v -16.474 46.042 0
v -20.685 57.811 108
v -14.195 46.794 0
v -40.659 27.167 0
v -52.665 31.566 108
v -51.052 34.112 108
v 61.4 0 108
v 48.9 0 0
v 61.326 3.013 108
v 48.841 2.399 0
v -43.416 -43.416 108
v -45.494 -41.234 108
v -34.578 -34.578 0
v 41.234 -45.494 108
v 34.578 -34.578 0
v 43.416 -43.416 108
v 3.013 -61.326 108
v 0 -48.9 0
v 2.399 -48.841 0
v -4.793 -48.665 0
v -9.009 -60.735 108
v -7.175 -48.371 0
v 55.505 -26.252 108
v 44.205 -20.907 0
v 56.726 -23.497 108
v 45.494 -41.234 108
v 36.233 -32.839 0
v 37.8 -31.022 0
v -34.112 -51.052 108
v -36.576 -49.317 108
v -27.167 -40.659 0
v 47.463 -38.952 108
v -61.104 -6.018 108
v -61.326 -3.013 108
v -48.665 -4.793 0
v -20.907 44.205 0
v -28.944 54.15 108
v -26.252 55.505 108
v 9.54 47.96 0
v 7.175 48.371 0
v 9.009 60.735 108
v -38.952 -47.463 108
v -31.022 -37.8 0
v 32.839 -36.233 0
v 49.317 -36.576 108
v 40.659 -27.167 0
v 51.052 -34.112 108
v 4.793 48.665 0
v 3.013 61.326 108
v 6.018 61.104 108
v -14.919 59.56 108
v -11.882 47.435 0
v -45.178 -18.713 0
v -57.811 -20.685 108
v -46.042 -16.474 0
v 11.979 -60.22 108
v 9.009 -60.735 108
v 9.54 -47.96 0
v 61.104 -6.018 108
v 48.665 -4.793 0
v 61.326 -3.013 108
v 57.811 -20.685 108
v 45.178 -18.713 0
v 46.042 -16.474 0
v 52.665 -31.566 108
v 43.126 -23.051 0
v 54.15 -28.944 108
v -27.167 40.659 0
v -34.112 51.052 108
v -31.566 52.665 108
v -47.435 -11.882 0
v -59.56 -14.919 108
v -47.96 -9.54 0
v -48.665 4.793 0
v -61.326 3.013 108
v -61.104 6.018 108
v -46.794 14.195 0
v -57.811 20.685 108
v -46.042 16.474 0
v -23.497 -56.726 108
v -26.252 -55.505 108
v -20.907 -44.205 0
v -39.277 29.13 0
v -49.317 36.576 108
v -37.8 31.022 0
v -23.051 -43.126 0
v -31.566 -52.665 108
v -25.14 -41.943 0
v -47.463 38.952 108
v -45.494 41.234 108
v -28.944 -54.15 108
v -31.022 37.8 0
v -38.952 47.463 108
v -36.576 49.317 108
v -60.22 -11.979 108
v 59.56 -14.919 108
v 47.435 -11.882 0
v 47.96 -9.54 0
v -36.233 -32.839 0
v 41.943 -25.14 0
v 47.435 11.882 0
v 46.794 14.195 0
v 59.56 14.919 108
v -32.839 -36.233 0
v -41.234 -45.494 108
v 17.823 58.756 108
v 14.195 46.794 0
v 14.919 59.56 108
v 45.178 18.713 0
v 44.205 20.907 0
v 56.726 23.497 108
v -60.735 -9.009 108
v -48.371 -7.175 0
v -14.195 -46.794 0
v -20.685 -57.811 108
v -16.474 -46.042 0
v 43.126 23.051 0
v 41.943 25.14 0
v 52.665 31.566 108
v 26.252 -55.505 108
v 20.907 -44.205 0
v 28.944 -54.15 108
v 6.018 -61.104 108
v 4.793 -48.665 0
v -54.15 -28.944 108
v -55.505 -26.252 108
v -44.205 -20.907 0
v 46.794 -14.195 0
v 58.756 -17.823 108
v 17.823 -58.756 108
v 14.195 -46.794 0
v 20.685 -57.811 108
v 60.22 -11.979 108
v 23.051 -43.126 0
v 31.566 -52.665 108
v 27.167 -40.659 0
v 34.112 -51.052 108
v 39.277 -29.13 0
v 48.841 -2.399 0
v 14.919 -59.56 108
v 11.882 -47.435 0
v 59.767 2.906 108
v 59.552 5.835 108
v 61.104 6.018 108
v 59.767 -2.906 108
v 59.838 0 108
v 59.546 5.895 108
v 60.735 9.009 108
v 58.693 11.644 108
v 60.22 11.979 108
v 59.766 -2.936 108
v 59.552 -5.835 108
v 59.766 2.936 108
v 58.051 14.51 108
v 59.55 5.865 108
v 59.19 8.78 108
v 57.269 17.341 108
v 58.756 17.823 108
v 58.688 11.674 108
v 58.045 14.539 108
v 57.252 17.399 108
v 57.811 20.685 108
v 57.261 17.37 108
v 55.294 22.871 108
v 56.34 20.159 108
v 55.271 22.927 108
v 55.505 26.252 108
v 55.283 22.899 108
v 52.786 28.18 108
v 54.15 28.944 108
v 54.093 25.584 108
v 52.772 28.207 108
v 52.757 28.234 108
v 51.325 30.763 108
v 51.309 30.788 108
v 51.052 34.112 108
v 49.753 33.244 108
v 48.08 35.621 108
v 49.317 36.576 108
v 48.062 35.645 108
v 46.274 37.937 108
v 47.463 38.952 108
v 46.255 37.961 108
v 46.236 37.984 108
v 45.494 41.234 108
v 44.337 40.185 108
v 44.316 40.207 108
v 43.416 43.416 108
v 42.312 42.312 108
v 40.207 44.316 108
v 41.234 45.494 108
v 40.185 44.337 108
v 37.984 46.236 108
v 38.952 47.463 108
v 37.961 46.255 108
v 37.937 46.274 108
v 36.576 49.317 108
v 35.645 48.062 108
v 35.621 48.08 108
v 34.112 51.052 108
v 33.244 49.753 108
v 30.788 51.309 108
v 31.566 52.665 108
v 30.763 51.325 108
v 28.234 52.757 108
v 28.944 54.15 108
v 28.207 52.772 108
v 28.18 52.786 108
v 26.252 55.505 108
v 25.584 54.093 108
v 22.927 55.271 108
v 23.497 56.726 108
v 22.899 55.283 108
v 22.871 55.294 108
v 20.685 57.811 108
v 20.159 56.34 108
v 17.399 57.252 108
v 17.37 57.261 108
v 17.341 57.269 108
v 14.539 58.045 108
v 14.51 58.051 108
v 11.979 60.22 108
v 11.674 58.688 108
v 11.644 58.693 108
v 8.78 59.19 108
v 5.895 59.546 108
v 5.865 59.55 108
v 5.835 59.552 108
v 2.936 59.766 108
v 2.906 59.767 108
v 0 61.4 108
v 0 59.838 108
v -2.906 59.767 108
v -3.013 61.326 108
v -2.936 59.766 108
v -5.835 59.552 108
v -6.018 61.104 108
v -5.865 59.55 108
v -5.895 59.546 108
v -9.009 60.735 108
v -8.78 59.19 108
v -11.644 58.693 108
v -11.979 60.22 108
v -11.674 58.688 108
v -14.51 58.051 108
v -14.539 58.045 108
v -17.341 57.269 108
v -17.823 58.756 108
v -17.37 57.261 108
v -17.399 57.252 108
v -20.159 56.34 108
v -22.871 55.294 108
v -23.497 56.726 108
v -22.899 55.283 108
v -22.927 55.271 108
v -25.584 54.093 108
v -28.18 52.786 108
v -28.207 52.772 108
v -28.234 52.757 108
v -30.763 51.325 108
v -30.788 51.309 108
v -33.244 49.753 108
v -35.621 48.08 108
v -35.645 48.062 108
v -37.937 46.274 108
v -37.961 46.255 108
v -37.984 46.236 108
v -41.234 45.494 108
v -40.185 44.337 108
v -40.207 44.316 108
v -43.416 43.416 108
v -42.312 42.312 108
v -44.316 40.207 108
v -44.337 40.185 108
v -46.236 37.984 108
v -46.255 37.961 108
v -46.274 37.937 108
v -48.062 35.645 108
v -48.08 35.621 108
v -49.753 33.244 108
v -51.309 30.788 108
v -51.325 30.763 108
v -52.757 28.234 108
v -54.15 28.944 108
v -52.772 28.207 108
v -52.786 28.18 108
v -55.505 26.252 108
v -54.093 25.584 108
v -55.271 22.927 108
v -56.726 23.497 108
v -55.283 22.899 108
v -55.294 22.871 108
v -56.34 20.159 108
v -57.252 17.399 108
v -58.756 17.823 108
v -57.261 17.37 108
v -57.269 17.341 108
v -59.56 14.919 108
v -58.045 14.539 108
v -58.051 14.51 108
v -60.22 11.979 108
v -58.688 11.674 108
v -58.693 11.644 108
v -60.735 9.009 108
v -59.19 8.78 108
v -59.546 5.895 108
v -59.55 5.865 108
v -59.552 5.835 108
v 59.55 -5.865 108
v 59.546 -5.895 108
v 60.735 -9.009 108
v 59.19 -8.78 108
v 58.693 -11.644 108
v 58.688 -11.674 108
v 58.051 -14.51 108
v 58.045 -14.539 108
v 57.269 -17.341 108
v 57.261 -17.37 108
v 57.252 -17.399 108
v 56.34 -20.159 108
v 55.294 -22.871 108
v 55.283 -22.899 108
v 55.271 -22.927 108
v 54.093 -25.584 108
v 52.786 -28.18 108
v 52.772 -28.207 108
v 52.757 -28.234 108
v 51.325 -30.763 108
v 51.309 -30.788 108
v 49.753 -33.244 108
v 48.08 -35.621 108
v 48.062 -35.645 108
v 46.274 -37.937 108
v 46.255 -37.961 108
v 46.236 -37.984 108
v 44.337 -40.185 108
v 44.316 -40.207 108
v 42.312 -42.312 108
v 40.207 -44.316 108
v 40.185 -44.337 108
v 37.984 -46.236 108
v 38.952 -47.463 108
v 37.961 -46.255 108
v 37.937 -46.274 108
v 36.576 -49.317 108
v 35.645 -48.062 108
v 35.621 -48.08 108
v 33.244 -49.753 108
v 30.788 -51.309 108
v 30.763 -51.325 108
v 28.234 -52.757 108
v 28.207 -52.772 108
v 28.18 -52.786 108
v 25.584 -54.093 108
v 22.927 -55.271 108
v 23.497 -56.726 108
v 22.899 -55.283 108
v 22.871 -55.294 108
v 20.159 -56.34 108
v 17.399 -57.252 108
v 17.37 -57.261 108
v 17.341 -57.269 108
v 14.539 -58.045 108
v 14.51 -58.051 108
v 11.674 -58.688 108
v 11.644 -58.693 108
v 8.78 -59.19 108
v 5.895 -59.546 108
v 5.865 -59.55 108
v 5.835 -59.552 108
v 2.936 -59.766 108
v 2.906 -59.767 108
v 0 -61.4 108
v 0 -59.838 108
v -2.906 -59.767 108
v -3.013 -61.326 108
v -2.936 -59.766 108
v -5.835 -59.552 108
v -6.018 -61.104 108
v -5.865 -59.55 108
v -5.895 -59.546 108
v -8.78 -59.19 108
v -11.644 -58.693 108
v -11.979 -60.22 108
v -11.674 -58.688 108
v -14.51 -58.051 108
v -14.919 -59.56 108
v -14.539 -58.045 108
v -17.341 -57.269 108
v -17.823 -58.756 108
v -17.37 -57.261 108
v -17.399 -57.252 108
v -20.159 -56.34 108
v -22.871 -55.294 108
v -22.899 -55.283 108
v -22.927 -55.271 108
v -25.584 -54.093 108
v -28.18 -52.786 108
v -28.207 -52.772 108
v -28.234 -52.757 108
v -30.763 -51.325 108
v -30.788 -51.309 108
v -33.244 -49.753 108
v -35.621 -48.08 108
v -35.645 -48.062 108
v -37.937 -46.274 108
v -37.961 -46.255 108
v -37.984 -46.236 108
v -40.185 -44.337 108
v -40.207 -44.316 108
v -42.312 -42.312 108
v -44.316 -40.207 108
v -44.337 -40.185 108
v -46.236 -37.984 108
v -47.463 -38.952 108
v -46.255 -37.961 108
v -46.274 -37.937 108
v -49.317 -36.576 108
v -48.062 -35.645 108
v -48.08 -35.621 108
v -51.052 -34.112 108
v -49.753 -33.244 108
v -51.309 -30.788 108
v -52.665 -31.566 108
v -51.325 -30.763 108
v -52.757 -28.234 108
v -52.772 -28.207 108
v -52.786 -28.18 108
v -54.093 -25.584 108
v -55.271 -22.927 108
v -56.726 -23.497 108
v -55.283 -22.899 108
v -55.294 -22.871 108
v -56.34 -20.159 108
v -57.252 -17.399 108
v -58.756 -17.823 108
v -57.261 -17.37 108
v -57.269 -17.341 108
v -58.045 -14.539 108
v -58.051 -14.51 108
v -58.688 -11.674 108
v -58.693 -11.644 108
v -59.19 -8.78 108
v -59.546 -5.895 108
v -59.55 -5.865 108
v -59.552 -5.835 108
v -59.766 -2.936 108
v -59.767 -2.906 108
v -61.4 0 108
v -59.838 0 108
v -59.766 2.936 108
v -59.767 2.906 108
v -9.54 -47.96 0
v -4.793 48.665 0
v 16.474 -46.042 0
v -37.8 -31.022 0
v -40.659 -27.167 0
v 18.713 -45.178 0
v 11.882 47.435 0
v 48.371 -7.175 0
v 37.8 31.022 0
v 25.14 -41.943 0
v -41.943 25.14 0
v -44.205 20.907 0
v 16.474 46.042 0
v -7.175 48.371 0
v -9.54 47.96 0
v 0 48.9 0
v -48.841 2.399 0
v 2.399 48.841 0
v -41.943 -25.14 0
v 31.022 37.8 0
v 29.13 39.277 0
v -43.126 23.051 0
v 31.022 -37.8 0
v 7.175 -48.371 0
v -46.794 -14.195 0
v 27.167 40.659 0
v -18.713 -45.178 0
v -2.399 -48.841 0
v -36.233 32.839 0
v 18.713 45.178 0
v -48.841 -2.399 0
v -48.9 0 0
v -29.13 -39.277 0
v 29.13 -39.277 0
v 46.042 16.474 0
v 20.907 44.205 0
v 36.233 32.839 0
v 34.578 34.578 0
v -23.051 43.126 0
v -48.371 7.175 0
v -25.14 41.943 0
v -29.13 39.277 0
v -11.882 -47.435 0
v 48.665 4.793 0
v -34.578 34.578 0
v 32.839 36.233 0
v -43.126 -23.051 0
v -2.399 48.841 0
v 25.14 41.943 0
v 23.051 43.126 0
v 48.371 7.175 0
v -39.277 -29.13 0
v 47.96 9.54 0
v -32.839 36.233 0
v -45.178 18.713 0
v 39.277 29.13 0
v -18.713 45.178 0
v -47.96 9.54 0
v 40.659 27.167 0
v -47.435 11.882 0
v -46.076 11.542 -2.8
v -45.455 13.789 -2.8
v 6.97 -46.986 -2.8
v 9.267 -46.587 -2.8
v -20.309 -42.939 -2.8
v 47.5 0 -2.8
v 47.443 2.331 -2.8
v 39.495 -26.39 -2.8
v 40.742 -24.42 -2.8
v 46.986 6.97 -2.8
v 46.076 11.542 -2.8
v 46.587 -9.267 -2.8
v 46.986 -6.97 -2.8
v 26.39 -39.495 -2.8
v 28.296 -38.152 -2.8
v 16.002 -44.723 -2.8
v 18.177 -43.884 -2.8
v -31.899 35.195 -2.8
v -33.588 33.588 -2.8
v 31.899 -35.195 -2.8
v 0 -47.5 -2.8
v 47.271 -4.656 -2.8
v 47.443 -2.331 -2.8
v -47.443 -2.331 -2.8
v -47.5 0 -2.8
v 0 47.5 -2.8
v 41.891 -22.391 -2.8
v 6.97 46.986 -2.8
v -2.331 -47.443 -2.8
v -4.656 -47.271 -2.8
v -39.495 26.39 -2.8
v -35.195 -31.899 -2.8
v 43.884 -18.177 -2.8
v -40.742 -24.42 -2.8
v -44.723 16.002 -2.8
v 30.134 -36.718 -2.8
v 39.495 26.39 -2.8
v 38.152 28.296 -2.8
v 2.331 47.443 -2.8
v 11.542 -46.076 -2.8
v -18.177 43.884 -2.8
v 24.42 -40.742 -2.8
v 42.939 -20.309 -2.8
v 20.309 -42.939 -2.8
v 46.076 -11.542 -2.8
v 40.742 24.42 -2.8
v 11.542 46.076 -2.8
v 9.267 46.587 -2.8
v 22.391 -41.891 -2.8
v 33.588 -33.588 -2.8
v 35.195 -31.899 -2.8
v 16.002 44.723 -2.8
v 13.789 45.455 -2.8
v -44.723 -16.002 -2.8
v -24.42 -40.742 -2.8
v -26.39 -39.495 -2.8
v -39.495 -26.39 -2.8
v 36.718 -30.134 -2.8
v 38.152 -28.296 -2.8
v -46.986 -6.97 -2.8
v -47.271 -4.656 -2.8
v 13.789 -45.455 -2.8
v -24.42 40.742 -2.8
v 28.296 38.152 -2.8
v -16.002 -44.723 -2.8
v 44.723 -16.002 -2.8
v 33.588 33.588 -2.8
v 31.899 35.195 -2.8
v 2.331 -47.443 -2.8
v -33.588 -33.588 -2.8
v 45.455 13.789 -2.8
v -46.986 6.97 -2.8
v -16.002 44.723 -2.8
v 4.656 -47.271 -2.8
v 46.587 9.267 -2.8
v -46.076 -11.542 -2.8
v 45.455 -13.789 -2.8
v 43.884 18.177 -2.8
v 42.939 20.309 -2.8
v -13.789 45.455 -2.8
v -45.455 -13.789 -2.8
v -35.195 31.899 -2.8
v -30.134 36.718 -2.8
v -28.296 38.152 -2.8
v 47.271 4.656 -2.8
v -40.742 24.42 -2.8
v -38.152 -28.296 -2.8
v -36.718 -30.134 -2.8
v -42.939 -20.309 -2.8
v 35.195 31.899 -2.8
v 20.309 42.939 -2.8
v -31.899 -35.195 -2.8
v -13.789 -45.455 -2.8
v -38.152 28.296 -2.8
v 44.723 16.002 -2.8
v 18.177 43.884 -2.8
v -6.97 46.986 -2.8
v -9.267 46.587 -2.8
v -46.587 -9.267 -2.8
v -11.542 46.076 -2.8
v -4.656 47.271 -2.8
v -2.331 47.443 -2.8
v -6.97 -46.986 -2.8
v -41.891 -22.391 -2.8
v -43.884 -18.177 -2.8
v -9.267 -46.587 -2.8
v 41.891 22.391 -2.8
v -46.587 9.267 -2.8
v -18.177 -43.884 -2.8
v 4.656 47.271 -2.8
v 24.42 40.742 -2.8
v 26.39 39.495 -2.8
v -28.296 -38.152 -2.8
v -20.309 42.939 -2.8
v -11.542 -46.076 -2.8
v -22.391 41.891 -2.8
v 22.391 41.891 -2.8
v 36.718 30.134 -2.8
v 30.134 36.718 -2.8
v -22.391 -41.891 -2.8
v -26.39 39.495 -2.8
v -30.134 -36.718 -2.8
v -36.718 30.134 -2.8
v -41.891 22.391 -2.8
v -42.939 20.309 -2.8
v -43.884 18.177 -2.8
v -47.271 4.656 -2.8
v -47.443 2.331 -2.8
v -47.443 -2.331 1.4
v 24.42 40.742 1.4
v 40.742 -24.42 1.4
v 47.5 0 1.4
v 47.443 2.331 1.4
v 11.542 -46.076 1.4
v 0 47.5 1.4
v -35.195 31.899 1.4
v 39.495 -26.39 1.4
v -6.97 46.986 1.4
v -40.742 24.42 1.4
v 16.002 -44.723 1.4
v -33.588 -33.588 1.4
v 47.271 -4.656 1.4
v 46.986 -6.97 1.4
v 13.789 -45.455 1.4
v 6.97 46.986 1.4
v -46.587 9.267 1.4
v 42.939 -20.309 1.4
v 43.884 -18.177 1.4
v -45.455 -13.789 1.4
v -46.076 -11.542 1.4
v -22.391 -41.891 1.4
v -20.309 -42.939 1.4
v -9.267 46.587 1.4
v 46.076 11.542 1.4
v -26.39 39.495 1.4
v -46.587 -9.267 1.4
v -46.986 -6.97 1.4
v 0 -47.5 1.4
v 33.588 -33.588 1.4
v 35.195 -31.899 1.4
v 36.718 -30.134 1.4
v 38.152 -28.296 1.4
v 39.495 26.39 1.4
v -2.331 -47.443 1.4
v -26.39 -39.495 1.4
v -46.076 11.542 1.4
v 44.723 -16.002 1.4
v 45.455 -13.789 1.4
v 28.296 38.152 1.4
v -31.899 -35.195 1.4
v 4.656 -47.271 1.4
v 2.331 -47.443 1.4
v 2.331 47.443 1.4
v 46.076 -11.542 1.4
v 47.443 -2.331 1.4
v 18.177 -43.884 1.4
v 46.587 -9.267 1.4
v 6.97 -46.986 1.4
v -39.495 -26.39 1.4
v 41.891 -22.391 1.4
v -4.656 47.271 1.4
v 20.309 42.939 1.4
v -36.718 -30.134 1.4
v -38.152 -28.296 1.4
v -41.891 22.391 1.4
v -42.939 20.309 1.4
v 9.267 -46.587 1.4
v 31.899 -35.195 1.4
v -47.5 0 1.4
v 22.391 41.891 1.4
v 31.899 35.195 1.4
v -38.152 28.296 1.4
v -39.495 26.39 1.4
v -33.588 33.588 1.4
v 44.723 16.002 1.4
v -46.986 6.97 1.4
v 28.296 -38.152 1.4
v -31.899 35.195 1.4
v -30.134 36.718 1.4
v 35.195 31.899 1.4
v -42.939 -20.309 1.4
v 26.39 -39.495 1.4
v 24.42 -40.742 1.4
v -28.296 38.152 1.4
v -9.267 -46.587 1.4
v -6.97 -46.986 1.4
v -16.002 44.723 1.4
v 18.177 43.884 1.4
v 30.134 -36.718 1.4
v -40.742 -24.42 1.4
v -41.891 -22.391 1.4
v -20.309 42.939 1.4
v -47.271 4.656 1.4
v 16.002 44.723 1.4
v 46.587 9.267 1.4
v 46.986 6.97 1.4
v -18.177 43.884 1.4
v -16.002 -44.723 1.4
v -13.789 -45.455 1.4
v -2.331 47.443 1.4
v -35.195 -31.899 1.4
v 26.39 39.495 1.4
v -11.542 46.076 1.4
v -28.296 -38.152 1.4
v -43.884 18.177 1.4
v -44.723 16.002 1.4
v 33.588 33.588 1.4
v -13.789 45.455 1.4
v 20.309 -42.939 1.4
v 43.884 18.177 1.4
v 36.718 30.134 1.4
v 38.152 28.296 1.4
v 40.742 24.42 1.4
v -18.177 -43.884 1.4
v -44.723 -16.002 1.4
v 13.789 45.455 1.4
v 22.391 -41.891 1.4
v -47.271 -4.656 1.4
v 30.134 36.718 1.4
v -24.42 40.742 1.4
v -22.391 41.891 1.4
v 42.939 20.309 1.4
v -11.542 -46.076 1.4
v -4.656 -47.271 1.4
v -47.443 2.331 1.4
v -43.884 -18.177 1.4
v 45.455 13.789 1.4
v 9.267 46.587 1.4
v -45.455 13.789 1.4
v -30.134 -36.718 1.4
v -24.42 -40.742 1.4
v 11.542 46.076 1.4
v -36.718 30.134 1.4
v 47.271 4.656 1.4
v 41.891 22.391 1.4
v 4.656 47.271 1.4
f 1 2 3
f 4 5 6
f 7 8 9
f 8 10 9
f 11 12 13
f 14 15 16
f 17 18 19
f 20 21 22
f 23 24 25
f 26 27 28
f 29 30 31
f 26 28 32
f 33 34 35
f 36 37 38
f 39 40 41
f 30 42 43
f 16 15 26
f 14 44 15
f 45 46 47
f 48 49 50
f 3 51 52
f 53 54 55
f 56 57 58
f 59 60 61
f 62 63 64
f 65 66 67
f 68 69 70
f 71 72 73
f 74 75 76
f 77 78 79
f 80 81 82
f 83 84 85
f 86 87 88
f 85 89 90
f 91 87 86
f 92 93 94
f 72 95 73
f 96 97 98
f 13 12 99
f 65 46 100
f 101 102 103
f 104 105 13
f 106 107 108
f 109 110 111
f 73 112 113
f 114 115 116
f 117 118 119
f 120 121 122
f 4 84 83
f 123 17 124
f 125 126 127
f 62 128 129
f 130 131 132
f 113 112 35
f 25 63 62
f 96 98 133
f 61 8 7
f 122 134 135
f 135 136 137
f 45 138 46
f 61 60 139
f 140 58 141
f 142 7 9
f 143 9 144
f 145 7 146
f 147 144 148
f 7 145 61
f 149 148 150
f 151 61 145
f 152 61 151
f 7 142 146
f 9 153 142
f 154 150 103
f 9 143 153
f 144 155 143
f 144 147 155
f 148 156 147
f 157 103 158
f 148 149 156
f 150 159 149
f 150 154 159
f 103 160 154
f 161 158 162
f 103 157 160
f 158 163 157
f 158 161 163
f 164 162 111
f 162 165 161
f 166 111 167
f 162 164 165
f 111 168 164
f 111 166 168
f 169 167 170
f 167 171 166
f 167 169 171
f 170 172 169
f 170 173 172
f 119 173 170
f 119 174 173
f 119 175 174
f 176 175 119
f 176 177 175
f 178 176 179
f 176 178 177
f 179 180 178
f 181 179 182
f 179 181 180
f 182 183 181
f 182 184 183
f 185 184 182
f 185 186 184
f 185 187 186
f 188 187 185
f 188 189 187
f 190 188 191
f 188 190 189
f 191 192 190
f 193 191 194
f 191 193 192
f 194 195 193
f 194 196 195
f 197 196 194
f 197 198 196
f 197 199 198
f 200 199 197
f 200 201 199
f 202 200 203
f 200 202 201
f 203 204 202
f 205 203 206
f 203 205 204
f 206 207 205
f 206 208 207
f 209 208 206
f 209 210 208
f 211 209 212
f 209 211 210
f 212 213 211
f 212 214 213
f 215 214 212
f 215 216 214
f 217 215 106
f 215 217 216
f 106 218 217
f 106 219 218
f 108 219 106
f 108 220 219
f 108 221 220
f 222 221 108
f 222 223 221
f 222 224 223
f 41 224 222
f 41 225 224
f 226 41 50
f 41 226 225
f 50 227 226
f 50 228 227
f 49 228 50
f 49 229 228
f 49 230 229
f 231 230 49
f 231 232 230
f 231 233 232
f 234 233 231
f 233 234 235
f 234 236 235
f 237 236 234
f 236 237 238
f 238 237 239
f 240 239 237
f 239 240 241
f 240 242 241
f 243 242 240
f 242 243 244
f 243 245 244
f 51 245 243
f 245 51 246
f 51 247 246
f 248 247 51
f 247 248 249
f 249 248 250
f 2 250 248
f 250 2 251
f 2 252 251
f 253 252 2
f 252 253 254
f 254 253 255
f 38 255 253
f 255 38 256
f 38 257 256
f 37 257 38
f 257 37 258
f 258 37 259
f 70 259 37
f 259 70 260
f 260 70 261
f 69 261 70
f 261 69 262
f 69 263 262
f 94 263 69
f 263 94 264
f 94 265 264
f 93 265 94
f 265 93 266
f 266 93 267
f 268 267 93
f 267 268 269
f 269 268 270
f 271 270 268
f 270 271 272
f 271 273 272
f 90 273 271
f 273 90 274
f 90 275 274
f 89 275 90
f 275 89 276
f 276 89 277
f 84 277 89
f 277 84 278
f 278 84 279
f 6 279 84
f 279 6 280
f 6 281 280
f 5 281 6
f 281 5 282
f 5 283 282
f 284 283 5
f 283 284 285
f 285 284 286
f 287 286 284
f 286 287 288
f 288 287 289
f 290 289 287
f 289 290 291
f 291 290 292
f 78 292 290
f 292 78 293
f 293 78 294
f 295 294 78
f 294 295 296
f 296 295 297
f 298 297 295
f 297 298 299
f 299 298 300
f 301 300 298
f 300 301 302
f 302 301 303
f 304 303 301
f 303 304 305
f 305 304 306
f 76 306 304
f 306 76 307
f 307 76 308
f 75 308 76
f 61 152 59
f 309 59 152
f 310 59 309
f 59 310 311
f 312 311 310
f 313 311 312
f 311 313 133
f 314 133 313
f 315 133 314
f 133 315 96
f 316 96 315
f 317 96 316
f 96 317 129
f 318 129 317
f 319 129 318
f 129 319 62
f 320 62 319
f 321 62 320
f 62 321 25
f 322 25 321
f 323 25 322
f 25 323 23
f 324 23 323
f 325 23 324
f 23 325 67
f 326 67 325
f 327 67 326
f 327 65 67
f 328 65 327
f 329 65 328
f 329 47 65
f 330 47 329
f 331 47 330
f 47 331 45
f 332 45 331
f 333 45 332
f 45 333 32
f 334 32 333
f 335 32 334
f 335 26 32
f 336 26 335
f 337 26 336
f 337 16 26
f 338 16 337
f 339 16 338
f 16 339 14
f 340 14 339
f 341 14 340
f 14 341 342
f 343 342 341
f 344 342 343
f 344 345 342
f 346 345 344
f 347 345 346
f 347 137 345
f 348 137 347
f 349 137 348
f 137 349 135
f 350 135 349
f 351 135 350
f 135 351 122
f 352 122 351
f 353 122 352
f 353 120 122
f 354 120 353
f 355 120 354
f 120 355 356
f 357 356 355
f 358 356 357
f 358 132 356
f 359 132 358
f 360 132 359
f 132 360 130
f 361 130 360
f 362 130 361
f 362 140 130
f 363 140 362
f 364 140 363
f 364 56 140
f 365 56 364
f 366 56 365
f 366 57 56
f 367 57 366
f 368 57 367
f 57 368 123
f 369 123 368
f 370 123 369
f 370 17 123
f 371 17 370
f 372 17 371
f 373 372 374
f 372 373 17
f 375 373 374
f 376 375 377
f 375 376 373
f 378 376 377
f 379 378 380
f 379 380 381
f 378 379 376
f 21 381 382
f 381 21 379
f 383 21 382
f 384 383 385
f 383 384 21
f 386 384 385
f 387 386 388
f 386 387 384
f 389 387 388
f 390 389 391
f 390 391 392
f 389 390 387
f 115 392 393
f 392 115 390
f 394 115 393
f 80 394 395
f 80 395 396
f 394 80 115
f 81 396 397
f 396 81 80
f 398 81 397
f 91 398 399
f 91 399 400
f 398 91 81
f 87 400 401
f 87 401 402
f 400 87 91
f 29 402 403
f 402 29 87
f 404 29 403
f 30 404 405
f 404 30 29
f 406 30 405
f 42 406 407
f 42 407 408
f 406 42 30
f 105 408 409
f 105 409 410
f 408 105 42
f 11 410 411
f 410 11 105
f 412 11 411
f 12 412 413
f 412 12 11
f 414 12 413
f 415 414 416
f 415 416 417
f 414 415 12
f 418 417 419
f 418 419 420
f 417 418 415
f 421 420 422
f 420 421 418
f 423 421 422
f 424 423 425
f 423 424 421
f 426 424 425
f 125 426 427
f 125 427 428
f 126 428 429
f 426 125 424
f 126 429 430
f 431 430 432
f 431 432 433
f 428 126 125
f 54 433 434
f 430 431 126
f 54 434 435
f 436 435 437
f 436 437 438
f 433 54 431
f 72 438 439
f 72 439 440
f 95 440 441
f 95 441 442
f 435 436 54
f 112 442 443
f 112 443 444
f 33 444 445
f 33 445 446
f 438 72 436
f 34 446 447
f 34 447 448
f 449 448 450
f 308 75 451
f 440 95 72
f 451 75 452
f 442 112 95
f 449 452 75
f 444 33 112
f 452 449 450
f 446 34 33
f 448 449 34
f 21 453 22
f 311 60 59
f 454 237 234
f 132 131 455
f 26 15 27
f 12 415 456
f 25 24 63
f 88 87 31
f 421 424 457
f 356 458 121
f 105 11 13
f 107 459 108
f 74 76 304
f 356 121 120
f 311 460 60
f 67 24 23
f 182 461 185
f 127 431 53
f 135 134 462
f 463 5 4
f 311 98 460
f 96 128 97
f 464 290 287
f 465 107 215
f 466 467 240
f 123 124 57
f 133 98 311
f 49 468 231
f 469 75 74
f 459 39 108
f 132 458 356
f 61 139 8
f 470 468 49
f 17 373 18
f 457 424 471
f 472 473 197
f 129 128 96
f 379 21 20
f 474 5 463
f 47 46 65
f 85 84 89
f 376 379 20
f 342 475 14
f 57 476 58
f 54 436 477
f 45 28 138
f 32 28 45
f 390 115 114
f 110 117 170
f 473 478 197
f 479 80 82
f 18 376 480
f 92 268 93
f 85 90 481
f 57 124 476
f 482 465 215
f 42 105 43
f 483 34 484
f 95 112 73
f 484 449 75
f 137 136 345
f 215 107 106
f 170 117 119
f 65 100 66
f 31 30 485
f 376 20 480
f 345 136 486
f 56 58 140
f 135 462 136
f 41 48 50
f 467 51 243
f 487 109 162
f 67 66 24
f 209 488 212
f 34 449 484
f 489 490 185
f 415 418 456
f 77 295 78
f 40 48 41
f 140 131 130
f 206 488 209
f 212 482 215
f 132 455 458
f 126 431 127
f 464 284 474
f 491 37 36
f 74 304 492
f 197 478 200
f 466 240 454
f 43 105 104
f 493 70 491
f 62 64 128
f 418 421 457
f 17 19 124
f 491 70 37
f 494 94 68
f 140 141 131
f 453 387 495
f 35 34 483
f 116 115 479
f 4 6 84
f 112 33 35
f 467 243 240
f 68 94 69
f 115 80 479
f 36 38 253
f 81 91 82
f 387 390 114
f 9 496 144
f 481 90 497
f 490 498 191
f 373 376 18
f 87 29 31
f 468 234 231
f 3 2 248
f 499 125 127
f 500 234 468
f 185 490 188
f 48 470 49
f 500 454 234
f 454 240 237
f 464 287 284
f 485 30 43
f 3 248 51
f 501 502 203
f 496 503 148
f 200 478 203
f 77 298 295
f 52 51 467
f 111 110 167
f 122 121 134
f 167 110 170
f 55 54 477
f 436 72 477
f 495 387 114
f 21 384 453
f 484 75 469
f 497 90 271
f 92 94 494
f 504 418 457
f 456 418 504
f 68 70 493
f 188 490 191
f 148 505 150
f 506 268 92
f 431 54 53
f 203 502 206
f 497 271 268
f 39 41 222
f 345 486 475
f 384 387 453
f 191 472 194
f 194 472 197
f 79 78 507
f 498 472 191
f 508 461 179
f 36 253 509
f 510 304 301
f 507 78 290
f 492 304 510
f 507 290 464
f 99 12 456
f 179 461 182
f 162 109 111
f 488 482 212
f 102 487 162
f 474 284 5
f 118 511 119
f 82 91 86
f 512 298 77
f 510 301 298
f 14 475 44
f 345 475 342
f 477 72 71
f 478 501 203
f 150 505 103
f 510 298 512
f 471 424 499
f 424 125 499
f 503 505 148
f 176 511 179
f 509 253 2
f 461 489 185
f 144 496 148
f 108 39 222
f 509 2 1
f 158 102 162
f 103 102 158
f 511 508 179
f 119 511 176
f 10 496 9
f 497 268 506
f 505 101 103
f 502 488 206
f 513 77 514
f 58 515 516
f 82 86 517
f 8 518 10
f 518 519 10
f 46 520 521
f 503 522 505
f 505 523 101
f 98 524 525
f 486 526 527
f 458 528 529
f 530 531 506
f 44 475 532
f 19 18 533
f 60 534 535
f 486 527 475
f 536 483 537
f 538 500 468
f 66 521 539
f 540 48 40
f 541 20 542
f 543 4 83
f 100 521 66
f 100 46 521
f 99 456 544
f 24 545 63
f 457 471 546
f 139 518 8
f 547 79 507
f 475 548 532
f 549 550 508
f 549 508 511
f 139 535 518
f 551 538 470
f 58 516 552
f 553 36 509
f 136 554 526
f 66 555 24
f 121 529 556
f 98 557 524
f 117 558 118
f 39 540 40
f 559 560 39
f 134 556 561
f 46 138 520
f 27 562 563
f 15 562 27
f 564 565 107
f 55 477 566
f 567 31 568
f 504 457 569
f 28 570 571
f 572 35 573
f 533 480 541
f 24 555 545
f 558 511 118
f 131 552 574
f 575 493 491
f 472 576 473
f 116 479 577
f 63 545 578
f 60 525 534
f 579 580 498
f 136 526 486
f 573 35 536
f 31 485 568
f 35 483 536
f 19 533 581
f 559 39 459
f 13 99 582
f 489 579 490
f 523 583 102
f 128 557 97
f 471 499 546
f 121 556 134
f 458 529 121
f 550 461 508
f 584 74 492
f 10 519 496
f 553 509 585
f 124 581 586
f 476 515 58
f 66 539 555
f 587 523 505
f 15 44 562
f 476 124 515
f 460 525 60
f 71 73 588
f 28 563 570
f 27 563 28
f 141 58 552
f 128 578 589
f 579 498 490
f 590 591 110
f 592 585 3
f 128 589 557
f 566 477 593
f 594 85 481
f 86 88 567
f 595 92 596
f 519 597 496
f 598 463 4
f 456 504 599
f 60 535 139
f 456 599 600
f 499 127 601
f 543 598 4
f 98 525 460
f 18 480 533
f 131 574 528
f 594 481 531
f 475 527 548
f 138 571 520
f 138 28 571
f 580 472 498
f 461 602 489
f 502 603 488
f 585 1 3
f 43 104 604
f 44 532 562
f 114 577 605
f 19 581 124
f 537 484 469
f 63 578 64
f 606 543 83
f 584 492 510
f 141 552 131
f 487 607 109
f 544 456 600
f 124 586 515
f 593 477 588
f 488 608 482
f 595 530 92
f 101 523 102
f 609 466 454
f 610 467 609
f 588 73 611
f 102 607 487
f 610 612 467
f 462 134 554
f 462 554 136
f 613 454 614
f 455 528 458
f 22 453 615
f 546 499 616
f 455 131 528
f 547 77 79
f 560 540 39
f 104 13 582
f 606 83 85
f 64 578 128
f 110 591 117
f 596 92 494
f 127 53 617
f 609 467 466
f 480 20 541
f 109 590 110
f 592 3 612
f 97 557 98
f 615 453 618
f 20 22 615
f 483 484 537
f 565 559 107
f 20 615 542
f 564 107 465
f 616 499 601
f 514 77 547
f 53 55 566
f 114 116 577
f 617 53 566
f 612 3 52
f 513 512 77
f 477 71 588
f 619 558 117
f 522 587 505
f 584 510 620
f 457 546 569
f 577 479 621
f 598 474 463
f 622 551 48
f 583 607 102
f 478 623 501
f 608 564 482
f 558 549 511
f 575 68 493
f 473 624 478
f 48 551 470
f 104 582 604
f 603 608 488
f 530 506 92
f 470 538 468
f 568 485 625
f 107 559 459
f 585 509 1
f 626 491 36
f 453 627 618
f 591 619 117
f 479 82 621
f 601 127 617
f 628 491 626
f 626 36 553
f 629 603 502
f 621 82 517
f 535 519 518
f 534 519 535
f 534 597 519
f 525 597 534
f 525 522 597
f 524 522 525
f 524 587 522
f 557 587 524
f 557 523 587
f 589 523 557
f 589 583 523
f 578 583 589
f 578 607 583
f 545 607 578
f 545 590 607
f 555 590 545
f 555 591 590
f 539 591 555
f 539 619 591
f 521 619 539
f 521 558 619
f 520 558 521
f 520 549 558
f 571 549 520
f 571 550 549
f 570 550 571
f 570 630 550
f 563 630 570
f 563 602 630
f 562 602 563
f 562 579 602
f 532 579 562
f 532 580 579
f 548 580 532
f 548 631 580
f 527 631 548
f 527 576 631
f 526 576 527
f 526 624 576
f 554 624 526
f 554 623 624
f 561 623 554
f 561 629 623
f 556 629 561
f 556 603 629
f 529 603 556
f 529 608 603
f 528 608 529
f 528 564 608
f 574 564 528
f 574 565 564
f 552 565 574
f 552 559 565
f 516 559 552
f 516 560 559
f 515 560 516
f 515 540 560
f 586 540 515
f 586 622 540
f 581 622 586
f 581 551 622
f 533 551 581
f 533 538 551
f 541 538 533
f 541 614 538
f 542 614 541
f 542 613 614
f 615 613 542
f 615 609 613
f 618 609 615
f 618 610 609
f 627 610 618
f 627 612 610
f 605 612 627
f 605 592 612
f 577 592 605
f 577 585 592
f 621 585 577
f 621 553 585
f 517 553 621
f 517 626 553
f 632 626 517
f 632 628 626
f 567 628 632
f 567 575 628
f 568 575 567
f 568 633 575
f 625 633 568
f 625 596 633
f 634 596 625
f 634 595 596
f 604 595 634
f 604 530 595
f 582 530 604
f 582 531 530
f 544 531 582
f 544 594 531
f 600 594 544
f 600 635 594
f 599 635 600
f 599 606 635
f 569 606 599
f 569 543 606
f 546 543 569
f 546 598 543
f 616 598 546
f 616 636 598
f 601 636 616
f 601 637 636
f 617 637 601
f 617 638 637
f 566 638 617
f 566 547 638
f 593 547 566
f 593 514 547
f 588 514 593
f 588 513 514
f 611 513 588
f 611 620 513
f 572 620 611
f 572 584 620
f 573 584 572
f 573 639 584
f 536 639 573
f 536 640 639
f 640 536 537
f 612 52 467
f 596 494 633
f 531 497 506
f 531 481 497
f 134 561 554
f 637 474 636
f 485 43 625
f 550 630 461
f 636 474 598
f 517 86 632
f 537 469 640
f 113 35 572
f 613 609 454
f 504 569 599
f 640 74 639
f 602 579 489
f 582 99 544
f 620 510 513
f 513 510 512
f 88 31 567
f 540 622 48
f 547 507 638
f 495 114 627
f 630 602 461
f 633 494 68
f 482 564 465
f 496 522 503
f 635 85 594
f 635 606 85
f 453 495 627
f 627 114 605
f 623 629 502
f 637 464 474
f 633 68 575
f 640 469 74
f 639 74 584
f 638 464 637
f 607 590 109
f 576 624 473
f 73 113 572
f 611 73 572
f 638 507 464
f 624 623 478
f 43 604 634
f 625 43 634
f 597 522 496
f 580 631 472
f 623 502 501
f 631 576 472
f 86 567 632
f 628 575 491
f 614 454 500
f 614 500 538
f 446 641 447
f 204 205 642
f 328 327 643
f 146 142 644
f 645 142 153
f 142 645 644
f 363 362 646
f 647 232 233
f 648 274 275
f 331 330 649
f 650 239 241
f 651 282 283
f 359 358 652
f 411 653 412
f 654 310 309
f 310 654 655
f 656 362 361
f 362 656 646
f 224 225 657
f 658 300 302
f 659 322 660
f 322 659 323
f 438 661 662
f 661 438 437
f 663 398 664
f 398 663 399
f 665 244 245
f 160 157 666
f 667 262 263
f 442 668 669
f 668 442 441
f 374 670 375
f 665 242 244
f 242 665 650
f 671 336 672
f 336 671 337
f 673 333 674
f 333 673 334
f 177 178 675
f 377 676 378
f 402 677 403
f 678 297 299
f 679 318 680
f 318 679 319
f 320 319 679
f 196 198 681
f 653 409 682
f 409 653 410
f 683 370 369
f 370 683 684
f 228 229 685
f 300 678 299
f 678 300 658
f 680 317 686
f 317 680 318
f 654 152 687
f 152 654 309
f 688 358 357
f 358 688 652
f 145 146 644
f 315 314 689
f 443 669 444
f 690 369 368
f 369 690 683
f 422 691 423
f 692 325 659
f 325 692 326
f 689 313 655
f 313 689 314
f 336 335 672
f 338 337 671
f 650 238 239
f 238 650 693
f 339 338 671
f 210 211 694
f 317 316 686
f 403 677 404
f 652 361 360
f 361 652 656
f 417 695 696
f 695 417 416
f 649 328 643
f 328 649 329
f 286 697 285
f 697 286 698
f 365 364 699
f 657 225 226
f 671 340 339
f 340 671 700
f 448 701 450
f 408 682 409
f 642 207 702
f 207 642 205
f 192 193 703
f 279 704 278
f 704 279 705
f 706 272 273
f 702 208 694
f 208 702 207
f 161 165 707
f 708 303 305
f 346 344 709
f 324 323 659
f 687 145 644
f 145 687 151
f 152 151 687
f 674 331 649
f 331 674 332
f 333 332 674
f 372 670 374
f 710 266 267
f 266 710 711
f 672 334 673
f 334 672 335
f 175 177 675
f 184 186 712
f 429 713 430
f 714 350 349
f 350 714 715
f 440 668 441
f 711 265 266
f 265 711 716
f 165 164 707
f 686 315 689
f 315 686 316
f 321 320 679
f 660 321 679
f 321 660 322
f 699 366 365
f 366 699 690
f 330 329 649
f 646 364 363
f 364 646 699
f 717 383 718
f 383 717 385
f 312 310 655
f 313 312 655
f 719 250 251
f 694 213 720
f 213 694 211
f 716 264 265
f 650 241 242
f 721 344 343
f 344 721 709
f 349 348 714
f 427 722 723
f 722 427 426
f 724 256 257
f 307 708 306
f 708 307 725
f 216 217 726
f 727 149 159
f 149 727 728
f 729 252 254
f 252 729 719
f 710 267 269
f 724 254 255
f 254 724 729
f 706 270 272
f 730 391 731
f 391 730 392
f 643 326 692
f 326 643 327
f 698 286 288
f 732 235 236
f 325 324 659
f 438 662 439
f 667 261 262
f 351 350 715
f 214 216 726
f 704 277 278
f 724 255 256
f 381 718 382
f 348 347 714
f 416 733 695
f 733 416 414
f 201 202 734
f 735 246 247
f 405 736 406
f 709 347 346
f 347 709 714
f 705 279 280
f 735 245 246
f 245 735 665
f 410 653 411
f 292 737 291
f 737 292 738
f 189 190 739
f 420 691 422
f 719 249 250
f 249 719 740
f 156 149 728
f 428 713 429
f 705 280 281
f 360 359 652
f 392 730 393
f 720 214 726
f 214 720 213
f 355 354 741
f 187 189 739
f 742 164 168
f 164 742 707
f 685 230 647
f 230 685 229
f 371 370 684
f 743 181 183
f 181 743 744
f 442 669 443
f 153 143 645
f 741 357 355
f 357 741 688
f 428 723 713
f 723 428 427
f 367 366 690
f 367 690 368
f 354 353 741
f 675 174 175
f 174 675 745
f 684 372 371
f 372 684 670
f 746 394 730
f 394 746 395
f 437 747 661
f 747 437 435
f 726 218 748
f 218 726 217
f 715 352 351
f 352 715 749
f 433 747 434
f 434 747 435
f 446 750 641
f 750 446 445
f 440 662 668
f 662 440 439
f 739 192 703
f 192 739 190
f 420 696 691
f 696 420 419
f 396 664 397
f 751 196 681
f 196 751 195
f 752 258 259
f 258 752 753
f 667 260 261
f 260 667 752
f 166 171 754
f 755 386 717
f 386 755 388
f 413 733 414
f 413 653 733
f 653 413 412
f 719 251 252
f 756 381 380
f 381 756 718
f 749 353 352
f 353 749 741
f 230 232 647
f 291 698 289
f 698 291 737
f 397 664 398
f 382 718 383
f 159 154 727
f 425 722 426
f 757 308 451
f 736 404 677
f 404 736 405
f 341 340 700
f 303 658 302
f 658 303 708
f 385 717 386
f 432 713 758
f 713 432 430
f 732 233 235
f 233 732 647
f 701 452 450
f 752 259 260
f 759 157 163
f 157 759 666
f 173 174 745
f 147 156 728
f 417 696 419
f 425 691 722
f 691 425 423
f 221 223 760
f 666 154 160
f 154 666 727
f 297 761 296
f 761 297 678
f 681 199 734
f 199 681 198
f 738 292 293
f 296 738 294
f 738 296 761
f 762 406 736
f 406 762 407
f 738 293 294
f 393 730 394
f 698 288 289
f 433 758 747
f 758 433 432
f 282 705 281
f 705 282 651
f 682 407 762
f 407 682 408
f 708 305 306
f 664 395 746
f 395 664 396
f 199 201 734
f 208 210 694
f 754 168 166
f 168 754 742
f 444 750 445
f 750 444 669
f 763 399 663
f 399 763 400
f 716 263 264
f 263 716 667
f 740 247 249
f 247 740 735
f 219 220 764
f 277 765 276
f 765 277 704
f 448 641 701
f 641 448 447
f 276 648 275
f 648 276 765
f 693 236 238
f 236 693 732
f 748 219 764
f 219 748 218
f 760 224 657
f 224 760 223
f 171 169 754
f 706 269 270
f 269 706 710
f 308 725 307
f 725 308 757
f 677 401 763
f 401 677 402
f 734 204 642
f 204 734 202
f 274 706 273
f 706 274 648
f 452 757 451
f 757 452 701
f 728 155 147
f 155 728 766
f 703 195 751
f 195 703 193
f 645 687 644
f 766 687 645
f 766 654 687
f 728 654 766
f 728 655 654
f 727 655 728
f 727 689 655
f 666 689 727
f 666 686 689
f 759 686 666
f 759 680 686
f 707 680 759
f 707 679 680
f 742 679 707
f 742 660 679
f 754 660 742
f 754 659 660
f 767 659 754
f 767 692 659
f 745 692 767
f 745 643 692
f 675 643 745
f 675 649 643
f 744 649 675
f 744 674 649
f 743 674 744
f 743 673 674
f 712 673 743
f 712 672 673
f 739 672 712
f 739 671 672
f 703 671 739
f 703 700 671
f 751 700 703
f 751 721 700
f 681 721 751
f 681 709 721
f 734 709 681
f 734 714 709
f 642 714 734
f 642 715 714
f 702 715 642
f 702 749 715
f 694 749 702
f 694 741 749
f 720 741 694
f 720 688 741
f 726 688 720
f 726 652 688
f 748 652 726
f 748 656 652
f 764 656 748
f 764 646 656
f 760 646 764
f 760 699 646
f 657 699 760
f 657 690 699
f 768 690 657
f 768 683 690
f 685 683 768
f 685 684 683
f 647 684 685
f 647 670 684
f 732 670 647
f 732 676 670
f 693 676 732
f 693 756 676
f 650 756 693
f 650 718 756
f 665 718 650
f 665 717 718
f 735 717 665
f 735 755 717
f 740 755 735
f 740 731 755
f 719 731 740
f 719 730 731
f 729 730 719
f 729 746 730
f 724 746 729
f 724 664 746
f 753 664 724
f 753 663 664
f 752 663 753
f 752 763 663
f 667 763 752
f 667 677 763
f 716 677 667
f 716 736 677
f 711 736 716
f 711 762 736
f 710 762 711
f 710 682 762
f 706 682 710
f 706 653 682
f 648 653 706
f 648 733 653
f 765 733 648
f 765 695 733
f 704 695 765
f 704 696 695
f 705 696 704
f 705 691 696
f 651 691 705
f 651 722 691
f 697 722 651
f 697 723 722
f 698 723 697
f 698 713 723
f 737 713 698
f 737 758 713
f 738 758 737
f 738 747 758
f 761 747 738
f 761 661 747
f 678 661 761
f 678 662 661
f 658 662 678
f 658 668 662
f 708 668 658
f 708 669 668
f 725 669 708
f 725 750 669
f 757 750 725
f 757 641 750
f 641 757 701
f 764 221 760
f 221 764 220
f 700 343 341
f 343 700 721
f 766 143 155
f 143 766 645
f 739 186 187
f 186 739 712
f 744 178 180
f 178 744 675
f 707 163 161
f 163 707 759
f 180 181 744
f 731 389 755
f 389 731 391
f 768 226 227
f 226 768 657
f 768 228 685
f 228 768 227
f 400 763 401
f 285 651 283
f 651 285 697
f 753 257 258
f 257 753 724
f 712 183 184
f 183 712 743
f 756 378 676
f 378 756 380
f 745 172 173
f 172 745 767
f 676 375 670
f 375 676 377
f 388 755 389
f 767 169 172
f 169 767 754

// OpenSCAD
// katzengrastop

$fn=128;

d1=120;
d2=95;
h=108;

s = 2*0.7;

difference(){
    union(){
        cylinder(r2=d1/2+s, r1=d2/2+s, h=h);
        // add some bottom-thickness
        translate([0, 0, -2*s])
        cylinder(r2=d2/2+s, r1=d2/2, h=2*s);
    }
    translate([0, 0, s])
    cylinder(r2=d1/2, r1=d2/2, h=h);
}
